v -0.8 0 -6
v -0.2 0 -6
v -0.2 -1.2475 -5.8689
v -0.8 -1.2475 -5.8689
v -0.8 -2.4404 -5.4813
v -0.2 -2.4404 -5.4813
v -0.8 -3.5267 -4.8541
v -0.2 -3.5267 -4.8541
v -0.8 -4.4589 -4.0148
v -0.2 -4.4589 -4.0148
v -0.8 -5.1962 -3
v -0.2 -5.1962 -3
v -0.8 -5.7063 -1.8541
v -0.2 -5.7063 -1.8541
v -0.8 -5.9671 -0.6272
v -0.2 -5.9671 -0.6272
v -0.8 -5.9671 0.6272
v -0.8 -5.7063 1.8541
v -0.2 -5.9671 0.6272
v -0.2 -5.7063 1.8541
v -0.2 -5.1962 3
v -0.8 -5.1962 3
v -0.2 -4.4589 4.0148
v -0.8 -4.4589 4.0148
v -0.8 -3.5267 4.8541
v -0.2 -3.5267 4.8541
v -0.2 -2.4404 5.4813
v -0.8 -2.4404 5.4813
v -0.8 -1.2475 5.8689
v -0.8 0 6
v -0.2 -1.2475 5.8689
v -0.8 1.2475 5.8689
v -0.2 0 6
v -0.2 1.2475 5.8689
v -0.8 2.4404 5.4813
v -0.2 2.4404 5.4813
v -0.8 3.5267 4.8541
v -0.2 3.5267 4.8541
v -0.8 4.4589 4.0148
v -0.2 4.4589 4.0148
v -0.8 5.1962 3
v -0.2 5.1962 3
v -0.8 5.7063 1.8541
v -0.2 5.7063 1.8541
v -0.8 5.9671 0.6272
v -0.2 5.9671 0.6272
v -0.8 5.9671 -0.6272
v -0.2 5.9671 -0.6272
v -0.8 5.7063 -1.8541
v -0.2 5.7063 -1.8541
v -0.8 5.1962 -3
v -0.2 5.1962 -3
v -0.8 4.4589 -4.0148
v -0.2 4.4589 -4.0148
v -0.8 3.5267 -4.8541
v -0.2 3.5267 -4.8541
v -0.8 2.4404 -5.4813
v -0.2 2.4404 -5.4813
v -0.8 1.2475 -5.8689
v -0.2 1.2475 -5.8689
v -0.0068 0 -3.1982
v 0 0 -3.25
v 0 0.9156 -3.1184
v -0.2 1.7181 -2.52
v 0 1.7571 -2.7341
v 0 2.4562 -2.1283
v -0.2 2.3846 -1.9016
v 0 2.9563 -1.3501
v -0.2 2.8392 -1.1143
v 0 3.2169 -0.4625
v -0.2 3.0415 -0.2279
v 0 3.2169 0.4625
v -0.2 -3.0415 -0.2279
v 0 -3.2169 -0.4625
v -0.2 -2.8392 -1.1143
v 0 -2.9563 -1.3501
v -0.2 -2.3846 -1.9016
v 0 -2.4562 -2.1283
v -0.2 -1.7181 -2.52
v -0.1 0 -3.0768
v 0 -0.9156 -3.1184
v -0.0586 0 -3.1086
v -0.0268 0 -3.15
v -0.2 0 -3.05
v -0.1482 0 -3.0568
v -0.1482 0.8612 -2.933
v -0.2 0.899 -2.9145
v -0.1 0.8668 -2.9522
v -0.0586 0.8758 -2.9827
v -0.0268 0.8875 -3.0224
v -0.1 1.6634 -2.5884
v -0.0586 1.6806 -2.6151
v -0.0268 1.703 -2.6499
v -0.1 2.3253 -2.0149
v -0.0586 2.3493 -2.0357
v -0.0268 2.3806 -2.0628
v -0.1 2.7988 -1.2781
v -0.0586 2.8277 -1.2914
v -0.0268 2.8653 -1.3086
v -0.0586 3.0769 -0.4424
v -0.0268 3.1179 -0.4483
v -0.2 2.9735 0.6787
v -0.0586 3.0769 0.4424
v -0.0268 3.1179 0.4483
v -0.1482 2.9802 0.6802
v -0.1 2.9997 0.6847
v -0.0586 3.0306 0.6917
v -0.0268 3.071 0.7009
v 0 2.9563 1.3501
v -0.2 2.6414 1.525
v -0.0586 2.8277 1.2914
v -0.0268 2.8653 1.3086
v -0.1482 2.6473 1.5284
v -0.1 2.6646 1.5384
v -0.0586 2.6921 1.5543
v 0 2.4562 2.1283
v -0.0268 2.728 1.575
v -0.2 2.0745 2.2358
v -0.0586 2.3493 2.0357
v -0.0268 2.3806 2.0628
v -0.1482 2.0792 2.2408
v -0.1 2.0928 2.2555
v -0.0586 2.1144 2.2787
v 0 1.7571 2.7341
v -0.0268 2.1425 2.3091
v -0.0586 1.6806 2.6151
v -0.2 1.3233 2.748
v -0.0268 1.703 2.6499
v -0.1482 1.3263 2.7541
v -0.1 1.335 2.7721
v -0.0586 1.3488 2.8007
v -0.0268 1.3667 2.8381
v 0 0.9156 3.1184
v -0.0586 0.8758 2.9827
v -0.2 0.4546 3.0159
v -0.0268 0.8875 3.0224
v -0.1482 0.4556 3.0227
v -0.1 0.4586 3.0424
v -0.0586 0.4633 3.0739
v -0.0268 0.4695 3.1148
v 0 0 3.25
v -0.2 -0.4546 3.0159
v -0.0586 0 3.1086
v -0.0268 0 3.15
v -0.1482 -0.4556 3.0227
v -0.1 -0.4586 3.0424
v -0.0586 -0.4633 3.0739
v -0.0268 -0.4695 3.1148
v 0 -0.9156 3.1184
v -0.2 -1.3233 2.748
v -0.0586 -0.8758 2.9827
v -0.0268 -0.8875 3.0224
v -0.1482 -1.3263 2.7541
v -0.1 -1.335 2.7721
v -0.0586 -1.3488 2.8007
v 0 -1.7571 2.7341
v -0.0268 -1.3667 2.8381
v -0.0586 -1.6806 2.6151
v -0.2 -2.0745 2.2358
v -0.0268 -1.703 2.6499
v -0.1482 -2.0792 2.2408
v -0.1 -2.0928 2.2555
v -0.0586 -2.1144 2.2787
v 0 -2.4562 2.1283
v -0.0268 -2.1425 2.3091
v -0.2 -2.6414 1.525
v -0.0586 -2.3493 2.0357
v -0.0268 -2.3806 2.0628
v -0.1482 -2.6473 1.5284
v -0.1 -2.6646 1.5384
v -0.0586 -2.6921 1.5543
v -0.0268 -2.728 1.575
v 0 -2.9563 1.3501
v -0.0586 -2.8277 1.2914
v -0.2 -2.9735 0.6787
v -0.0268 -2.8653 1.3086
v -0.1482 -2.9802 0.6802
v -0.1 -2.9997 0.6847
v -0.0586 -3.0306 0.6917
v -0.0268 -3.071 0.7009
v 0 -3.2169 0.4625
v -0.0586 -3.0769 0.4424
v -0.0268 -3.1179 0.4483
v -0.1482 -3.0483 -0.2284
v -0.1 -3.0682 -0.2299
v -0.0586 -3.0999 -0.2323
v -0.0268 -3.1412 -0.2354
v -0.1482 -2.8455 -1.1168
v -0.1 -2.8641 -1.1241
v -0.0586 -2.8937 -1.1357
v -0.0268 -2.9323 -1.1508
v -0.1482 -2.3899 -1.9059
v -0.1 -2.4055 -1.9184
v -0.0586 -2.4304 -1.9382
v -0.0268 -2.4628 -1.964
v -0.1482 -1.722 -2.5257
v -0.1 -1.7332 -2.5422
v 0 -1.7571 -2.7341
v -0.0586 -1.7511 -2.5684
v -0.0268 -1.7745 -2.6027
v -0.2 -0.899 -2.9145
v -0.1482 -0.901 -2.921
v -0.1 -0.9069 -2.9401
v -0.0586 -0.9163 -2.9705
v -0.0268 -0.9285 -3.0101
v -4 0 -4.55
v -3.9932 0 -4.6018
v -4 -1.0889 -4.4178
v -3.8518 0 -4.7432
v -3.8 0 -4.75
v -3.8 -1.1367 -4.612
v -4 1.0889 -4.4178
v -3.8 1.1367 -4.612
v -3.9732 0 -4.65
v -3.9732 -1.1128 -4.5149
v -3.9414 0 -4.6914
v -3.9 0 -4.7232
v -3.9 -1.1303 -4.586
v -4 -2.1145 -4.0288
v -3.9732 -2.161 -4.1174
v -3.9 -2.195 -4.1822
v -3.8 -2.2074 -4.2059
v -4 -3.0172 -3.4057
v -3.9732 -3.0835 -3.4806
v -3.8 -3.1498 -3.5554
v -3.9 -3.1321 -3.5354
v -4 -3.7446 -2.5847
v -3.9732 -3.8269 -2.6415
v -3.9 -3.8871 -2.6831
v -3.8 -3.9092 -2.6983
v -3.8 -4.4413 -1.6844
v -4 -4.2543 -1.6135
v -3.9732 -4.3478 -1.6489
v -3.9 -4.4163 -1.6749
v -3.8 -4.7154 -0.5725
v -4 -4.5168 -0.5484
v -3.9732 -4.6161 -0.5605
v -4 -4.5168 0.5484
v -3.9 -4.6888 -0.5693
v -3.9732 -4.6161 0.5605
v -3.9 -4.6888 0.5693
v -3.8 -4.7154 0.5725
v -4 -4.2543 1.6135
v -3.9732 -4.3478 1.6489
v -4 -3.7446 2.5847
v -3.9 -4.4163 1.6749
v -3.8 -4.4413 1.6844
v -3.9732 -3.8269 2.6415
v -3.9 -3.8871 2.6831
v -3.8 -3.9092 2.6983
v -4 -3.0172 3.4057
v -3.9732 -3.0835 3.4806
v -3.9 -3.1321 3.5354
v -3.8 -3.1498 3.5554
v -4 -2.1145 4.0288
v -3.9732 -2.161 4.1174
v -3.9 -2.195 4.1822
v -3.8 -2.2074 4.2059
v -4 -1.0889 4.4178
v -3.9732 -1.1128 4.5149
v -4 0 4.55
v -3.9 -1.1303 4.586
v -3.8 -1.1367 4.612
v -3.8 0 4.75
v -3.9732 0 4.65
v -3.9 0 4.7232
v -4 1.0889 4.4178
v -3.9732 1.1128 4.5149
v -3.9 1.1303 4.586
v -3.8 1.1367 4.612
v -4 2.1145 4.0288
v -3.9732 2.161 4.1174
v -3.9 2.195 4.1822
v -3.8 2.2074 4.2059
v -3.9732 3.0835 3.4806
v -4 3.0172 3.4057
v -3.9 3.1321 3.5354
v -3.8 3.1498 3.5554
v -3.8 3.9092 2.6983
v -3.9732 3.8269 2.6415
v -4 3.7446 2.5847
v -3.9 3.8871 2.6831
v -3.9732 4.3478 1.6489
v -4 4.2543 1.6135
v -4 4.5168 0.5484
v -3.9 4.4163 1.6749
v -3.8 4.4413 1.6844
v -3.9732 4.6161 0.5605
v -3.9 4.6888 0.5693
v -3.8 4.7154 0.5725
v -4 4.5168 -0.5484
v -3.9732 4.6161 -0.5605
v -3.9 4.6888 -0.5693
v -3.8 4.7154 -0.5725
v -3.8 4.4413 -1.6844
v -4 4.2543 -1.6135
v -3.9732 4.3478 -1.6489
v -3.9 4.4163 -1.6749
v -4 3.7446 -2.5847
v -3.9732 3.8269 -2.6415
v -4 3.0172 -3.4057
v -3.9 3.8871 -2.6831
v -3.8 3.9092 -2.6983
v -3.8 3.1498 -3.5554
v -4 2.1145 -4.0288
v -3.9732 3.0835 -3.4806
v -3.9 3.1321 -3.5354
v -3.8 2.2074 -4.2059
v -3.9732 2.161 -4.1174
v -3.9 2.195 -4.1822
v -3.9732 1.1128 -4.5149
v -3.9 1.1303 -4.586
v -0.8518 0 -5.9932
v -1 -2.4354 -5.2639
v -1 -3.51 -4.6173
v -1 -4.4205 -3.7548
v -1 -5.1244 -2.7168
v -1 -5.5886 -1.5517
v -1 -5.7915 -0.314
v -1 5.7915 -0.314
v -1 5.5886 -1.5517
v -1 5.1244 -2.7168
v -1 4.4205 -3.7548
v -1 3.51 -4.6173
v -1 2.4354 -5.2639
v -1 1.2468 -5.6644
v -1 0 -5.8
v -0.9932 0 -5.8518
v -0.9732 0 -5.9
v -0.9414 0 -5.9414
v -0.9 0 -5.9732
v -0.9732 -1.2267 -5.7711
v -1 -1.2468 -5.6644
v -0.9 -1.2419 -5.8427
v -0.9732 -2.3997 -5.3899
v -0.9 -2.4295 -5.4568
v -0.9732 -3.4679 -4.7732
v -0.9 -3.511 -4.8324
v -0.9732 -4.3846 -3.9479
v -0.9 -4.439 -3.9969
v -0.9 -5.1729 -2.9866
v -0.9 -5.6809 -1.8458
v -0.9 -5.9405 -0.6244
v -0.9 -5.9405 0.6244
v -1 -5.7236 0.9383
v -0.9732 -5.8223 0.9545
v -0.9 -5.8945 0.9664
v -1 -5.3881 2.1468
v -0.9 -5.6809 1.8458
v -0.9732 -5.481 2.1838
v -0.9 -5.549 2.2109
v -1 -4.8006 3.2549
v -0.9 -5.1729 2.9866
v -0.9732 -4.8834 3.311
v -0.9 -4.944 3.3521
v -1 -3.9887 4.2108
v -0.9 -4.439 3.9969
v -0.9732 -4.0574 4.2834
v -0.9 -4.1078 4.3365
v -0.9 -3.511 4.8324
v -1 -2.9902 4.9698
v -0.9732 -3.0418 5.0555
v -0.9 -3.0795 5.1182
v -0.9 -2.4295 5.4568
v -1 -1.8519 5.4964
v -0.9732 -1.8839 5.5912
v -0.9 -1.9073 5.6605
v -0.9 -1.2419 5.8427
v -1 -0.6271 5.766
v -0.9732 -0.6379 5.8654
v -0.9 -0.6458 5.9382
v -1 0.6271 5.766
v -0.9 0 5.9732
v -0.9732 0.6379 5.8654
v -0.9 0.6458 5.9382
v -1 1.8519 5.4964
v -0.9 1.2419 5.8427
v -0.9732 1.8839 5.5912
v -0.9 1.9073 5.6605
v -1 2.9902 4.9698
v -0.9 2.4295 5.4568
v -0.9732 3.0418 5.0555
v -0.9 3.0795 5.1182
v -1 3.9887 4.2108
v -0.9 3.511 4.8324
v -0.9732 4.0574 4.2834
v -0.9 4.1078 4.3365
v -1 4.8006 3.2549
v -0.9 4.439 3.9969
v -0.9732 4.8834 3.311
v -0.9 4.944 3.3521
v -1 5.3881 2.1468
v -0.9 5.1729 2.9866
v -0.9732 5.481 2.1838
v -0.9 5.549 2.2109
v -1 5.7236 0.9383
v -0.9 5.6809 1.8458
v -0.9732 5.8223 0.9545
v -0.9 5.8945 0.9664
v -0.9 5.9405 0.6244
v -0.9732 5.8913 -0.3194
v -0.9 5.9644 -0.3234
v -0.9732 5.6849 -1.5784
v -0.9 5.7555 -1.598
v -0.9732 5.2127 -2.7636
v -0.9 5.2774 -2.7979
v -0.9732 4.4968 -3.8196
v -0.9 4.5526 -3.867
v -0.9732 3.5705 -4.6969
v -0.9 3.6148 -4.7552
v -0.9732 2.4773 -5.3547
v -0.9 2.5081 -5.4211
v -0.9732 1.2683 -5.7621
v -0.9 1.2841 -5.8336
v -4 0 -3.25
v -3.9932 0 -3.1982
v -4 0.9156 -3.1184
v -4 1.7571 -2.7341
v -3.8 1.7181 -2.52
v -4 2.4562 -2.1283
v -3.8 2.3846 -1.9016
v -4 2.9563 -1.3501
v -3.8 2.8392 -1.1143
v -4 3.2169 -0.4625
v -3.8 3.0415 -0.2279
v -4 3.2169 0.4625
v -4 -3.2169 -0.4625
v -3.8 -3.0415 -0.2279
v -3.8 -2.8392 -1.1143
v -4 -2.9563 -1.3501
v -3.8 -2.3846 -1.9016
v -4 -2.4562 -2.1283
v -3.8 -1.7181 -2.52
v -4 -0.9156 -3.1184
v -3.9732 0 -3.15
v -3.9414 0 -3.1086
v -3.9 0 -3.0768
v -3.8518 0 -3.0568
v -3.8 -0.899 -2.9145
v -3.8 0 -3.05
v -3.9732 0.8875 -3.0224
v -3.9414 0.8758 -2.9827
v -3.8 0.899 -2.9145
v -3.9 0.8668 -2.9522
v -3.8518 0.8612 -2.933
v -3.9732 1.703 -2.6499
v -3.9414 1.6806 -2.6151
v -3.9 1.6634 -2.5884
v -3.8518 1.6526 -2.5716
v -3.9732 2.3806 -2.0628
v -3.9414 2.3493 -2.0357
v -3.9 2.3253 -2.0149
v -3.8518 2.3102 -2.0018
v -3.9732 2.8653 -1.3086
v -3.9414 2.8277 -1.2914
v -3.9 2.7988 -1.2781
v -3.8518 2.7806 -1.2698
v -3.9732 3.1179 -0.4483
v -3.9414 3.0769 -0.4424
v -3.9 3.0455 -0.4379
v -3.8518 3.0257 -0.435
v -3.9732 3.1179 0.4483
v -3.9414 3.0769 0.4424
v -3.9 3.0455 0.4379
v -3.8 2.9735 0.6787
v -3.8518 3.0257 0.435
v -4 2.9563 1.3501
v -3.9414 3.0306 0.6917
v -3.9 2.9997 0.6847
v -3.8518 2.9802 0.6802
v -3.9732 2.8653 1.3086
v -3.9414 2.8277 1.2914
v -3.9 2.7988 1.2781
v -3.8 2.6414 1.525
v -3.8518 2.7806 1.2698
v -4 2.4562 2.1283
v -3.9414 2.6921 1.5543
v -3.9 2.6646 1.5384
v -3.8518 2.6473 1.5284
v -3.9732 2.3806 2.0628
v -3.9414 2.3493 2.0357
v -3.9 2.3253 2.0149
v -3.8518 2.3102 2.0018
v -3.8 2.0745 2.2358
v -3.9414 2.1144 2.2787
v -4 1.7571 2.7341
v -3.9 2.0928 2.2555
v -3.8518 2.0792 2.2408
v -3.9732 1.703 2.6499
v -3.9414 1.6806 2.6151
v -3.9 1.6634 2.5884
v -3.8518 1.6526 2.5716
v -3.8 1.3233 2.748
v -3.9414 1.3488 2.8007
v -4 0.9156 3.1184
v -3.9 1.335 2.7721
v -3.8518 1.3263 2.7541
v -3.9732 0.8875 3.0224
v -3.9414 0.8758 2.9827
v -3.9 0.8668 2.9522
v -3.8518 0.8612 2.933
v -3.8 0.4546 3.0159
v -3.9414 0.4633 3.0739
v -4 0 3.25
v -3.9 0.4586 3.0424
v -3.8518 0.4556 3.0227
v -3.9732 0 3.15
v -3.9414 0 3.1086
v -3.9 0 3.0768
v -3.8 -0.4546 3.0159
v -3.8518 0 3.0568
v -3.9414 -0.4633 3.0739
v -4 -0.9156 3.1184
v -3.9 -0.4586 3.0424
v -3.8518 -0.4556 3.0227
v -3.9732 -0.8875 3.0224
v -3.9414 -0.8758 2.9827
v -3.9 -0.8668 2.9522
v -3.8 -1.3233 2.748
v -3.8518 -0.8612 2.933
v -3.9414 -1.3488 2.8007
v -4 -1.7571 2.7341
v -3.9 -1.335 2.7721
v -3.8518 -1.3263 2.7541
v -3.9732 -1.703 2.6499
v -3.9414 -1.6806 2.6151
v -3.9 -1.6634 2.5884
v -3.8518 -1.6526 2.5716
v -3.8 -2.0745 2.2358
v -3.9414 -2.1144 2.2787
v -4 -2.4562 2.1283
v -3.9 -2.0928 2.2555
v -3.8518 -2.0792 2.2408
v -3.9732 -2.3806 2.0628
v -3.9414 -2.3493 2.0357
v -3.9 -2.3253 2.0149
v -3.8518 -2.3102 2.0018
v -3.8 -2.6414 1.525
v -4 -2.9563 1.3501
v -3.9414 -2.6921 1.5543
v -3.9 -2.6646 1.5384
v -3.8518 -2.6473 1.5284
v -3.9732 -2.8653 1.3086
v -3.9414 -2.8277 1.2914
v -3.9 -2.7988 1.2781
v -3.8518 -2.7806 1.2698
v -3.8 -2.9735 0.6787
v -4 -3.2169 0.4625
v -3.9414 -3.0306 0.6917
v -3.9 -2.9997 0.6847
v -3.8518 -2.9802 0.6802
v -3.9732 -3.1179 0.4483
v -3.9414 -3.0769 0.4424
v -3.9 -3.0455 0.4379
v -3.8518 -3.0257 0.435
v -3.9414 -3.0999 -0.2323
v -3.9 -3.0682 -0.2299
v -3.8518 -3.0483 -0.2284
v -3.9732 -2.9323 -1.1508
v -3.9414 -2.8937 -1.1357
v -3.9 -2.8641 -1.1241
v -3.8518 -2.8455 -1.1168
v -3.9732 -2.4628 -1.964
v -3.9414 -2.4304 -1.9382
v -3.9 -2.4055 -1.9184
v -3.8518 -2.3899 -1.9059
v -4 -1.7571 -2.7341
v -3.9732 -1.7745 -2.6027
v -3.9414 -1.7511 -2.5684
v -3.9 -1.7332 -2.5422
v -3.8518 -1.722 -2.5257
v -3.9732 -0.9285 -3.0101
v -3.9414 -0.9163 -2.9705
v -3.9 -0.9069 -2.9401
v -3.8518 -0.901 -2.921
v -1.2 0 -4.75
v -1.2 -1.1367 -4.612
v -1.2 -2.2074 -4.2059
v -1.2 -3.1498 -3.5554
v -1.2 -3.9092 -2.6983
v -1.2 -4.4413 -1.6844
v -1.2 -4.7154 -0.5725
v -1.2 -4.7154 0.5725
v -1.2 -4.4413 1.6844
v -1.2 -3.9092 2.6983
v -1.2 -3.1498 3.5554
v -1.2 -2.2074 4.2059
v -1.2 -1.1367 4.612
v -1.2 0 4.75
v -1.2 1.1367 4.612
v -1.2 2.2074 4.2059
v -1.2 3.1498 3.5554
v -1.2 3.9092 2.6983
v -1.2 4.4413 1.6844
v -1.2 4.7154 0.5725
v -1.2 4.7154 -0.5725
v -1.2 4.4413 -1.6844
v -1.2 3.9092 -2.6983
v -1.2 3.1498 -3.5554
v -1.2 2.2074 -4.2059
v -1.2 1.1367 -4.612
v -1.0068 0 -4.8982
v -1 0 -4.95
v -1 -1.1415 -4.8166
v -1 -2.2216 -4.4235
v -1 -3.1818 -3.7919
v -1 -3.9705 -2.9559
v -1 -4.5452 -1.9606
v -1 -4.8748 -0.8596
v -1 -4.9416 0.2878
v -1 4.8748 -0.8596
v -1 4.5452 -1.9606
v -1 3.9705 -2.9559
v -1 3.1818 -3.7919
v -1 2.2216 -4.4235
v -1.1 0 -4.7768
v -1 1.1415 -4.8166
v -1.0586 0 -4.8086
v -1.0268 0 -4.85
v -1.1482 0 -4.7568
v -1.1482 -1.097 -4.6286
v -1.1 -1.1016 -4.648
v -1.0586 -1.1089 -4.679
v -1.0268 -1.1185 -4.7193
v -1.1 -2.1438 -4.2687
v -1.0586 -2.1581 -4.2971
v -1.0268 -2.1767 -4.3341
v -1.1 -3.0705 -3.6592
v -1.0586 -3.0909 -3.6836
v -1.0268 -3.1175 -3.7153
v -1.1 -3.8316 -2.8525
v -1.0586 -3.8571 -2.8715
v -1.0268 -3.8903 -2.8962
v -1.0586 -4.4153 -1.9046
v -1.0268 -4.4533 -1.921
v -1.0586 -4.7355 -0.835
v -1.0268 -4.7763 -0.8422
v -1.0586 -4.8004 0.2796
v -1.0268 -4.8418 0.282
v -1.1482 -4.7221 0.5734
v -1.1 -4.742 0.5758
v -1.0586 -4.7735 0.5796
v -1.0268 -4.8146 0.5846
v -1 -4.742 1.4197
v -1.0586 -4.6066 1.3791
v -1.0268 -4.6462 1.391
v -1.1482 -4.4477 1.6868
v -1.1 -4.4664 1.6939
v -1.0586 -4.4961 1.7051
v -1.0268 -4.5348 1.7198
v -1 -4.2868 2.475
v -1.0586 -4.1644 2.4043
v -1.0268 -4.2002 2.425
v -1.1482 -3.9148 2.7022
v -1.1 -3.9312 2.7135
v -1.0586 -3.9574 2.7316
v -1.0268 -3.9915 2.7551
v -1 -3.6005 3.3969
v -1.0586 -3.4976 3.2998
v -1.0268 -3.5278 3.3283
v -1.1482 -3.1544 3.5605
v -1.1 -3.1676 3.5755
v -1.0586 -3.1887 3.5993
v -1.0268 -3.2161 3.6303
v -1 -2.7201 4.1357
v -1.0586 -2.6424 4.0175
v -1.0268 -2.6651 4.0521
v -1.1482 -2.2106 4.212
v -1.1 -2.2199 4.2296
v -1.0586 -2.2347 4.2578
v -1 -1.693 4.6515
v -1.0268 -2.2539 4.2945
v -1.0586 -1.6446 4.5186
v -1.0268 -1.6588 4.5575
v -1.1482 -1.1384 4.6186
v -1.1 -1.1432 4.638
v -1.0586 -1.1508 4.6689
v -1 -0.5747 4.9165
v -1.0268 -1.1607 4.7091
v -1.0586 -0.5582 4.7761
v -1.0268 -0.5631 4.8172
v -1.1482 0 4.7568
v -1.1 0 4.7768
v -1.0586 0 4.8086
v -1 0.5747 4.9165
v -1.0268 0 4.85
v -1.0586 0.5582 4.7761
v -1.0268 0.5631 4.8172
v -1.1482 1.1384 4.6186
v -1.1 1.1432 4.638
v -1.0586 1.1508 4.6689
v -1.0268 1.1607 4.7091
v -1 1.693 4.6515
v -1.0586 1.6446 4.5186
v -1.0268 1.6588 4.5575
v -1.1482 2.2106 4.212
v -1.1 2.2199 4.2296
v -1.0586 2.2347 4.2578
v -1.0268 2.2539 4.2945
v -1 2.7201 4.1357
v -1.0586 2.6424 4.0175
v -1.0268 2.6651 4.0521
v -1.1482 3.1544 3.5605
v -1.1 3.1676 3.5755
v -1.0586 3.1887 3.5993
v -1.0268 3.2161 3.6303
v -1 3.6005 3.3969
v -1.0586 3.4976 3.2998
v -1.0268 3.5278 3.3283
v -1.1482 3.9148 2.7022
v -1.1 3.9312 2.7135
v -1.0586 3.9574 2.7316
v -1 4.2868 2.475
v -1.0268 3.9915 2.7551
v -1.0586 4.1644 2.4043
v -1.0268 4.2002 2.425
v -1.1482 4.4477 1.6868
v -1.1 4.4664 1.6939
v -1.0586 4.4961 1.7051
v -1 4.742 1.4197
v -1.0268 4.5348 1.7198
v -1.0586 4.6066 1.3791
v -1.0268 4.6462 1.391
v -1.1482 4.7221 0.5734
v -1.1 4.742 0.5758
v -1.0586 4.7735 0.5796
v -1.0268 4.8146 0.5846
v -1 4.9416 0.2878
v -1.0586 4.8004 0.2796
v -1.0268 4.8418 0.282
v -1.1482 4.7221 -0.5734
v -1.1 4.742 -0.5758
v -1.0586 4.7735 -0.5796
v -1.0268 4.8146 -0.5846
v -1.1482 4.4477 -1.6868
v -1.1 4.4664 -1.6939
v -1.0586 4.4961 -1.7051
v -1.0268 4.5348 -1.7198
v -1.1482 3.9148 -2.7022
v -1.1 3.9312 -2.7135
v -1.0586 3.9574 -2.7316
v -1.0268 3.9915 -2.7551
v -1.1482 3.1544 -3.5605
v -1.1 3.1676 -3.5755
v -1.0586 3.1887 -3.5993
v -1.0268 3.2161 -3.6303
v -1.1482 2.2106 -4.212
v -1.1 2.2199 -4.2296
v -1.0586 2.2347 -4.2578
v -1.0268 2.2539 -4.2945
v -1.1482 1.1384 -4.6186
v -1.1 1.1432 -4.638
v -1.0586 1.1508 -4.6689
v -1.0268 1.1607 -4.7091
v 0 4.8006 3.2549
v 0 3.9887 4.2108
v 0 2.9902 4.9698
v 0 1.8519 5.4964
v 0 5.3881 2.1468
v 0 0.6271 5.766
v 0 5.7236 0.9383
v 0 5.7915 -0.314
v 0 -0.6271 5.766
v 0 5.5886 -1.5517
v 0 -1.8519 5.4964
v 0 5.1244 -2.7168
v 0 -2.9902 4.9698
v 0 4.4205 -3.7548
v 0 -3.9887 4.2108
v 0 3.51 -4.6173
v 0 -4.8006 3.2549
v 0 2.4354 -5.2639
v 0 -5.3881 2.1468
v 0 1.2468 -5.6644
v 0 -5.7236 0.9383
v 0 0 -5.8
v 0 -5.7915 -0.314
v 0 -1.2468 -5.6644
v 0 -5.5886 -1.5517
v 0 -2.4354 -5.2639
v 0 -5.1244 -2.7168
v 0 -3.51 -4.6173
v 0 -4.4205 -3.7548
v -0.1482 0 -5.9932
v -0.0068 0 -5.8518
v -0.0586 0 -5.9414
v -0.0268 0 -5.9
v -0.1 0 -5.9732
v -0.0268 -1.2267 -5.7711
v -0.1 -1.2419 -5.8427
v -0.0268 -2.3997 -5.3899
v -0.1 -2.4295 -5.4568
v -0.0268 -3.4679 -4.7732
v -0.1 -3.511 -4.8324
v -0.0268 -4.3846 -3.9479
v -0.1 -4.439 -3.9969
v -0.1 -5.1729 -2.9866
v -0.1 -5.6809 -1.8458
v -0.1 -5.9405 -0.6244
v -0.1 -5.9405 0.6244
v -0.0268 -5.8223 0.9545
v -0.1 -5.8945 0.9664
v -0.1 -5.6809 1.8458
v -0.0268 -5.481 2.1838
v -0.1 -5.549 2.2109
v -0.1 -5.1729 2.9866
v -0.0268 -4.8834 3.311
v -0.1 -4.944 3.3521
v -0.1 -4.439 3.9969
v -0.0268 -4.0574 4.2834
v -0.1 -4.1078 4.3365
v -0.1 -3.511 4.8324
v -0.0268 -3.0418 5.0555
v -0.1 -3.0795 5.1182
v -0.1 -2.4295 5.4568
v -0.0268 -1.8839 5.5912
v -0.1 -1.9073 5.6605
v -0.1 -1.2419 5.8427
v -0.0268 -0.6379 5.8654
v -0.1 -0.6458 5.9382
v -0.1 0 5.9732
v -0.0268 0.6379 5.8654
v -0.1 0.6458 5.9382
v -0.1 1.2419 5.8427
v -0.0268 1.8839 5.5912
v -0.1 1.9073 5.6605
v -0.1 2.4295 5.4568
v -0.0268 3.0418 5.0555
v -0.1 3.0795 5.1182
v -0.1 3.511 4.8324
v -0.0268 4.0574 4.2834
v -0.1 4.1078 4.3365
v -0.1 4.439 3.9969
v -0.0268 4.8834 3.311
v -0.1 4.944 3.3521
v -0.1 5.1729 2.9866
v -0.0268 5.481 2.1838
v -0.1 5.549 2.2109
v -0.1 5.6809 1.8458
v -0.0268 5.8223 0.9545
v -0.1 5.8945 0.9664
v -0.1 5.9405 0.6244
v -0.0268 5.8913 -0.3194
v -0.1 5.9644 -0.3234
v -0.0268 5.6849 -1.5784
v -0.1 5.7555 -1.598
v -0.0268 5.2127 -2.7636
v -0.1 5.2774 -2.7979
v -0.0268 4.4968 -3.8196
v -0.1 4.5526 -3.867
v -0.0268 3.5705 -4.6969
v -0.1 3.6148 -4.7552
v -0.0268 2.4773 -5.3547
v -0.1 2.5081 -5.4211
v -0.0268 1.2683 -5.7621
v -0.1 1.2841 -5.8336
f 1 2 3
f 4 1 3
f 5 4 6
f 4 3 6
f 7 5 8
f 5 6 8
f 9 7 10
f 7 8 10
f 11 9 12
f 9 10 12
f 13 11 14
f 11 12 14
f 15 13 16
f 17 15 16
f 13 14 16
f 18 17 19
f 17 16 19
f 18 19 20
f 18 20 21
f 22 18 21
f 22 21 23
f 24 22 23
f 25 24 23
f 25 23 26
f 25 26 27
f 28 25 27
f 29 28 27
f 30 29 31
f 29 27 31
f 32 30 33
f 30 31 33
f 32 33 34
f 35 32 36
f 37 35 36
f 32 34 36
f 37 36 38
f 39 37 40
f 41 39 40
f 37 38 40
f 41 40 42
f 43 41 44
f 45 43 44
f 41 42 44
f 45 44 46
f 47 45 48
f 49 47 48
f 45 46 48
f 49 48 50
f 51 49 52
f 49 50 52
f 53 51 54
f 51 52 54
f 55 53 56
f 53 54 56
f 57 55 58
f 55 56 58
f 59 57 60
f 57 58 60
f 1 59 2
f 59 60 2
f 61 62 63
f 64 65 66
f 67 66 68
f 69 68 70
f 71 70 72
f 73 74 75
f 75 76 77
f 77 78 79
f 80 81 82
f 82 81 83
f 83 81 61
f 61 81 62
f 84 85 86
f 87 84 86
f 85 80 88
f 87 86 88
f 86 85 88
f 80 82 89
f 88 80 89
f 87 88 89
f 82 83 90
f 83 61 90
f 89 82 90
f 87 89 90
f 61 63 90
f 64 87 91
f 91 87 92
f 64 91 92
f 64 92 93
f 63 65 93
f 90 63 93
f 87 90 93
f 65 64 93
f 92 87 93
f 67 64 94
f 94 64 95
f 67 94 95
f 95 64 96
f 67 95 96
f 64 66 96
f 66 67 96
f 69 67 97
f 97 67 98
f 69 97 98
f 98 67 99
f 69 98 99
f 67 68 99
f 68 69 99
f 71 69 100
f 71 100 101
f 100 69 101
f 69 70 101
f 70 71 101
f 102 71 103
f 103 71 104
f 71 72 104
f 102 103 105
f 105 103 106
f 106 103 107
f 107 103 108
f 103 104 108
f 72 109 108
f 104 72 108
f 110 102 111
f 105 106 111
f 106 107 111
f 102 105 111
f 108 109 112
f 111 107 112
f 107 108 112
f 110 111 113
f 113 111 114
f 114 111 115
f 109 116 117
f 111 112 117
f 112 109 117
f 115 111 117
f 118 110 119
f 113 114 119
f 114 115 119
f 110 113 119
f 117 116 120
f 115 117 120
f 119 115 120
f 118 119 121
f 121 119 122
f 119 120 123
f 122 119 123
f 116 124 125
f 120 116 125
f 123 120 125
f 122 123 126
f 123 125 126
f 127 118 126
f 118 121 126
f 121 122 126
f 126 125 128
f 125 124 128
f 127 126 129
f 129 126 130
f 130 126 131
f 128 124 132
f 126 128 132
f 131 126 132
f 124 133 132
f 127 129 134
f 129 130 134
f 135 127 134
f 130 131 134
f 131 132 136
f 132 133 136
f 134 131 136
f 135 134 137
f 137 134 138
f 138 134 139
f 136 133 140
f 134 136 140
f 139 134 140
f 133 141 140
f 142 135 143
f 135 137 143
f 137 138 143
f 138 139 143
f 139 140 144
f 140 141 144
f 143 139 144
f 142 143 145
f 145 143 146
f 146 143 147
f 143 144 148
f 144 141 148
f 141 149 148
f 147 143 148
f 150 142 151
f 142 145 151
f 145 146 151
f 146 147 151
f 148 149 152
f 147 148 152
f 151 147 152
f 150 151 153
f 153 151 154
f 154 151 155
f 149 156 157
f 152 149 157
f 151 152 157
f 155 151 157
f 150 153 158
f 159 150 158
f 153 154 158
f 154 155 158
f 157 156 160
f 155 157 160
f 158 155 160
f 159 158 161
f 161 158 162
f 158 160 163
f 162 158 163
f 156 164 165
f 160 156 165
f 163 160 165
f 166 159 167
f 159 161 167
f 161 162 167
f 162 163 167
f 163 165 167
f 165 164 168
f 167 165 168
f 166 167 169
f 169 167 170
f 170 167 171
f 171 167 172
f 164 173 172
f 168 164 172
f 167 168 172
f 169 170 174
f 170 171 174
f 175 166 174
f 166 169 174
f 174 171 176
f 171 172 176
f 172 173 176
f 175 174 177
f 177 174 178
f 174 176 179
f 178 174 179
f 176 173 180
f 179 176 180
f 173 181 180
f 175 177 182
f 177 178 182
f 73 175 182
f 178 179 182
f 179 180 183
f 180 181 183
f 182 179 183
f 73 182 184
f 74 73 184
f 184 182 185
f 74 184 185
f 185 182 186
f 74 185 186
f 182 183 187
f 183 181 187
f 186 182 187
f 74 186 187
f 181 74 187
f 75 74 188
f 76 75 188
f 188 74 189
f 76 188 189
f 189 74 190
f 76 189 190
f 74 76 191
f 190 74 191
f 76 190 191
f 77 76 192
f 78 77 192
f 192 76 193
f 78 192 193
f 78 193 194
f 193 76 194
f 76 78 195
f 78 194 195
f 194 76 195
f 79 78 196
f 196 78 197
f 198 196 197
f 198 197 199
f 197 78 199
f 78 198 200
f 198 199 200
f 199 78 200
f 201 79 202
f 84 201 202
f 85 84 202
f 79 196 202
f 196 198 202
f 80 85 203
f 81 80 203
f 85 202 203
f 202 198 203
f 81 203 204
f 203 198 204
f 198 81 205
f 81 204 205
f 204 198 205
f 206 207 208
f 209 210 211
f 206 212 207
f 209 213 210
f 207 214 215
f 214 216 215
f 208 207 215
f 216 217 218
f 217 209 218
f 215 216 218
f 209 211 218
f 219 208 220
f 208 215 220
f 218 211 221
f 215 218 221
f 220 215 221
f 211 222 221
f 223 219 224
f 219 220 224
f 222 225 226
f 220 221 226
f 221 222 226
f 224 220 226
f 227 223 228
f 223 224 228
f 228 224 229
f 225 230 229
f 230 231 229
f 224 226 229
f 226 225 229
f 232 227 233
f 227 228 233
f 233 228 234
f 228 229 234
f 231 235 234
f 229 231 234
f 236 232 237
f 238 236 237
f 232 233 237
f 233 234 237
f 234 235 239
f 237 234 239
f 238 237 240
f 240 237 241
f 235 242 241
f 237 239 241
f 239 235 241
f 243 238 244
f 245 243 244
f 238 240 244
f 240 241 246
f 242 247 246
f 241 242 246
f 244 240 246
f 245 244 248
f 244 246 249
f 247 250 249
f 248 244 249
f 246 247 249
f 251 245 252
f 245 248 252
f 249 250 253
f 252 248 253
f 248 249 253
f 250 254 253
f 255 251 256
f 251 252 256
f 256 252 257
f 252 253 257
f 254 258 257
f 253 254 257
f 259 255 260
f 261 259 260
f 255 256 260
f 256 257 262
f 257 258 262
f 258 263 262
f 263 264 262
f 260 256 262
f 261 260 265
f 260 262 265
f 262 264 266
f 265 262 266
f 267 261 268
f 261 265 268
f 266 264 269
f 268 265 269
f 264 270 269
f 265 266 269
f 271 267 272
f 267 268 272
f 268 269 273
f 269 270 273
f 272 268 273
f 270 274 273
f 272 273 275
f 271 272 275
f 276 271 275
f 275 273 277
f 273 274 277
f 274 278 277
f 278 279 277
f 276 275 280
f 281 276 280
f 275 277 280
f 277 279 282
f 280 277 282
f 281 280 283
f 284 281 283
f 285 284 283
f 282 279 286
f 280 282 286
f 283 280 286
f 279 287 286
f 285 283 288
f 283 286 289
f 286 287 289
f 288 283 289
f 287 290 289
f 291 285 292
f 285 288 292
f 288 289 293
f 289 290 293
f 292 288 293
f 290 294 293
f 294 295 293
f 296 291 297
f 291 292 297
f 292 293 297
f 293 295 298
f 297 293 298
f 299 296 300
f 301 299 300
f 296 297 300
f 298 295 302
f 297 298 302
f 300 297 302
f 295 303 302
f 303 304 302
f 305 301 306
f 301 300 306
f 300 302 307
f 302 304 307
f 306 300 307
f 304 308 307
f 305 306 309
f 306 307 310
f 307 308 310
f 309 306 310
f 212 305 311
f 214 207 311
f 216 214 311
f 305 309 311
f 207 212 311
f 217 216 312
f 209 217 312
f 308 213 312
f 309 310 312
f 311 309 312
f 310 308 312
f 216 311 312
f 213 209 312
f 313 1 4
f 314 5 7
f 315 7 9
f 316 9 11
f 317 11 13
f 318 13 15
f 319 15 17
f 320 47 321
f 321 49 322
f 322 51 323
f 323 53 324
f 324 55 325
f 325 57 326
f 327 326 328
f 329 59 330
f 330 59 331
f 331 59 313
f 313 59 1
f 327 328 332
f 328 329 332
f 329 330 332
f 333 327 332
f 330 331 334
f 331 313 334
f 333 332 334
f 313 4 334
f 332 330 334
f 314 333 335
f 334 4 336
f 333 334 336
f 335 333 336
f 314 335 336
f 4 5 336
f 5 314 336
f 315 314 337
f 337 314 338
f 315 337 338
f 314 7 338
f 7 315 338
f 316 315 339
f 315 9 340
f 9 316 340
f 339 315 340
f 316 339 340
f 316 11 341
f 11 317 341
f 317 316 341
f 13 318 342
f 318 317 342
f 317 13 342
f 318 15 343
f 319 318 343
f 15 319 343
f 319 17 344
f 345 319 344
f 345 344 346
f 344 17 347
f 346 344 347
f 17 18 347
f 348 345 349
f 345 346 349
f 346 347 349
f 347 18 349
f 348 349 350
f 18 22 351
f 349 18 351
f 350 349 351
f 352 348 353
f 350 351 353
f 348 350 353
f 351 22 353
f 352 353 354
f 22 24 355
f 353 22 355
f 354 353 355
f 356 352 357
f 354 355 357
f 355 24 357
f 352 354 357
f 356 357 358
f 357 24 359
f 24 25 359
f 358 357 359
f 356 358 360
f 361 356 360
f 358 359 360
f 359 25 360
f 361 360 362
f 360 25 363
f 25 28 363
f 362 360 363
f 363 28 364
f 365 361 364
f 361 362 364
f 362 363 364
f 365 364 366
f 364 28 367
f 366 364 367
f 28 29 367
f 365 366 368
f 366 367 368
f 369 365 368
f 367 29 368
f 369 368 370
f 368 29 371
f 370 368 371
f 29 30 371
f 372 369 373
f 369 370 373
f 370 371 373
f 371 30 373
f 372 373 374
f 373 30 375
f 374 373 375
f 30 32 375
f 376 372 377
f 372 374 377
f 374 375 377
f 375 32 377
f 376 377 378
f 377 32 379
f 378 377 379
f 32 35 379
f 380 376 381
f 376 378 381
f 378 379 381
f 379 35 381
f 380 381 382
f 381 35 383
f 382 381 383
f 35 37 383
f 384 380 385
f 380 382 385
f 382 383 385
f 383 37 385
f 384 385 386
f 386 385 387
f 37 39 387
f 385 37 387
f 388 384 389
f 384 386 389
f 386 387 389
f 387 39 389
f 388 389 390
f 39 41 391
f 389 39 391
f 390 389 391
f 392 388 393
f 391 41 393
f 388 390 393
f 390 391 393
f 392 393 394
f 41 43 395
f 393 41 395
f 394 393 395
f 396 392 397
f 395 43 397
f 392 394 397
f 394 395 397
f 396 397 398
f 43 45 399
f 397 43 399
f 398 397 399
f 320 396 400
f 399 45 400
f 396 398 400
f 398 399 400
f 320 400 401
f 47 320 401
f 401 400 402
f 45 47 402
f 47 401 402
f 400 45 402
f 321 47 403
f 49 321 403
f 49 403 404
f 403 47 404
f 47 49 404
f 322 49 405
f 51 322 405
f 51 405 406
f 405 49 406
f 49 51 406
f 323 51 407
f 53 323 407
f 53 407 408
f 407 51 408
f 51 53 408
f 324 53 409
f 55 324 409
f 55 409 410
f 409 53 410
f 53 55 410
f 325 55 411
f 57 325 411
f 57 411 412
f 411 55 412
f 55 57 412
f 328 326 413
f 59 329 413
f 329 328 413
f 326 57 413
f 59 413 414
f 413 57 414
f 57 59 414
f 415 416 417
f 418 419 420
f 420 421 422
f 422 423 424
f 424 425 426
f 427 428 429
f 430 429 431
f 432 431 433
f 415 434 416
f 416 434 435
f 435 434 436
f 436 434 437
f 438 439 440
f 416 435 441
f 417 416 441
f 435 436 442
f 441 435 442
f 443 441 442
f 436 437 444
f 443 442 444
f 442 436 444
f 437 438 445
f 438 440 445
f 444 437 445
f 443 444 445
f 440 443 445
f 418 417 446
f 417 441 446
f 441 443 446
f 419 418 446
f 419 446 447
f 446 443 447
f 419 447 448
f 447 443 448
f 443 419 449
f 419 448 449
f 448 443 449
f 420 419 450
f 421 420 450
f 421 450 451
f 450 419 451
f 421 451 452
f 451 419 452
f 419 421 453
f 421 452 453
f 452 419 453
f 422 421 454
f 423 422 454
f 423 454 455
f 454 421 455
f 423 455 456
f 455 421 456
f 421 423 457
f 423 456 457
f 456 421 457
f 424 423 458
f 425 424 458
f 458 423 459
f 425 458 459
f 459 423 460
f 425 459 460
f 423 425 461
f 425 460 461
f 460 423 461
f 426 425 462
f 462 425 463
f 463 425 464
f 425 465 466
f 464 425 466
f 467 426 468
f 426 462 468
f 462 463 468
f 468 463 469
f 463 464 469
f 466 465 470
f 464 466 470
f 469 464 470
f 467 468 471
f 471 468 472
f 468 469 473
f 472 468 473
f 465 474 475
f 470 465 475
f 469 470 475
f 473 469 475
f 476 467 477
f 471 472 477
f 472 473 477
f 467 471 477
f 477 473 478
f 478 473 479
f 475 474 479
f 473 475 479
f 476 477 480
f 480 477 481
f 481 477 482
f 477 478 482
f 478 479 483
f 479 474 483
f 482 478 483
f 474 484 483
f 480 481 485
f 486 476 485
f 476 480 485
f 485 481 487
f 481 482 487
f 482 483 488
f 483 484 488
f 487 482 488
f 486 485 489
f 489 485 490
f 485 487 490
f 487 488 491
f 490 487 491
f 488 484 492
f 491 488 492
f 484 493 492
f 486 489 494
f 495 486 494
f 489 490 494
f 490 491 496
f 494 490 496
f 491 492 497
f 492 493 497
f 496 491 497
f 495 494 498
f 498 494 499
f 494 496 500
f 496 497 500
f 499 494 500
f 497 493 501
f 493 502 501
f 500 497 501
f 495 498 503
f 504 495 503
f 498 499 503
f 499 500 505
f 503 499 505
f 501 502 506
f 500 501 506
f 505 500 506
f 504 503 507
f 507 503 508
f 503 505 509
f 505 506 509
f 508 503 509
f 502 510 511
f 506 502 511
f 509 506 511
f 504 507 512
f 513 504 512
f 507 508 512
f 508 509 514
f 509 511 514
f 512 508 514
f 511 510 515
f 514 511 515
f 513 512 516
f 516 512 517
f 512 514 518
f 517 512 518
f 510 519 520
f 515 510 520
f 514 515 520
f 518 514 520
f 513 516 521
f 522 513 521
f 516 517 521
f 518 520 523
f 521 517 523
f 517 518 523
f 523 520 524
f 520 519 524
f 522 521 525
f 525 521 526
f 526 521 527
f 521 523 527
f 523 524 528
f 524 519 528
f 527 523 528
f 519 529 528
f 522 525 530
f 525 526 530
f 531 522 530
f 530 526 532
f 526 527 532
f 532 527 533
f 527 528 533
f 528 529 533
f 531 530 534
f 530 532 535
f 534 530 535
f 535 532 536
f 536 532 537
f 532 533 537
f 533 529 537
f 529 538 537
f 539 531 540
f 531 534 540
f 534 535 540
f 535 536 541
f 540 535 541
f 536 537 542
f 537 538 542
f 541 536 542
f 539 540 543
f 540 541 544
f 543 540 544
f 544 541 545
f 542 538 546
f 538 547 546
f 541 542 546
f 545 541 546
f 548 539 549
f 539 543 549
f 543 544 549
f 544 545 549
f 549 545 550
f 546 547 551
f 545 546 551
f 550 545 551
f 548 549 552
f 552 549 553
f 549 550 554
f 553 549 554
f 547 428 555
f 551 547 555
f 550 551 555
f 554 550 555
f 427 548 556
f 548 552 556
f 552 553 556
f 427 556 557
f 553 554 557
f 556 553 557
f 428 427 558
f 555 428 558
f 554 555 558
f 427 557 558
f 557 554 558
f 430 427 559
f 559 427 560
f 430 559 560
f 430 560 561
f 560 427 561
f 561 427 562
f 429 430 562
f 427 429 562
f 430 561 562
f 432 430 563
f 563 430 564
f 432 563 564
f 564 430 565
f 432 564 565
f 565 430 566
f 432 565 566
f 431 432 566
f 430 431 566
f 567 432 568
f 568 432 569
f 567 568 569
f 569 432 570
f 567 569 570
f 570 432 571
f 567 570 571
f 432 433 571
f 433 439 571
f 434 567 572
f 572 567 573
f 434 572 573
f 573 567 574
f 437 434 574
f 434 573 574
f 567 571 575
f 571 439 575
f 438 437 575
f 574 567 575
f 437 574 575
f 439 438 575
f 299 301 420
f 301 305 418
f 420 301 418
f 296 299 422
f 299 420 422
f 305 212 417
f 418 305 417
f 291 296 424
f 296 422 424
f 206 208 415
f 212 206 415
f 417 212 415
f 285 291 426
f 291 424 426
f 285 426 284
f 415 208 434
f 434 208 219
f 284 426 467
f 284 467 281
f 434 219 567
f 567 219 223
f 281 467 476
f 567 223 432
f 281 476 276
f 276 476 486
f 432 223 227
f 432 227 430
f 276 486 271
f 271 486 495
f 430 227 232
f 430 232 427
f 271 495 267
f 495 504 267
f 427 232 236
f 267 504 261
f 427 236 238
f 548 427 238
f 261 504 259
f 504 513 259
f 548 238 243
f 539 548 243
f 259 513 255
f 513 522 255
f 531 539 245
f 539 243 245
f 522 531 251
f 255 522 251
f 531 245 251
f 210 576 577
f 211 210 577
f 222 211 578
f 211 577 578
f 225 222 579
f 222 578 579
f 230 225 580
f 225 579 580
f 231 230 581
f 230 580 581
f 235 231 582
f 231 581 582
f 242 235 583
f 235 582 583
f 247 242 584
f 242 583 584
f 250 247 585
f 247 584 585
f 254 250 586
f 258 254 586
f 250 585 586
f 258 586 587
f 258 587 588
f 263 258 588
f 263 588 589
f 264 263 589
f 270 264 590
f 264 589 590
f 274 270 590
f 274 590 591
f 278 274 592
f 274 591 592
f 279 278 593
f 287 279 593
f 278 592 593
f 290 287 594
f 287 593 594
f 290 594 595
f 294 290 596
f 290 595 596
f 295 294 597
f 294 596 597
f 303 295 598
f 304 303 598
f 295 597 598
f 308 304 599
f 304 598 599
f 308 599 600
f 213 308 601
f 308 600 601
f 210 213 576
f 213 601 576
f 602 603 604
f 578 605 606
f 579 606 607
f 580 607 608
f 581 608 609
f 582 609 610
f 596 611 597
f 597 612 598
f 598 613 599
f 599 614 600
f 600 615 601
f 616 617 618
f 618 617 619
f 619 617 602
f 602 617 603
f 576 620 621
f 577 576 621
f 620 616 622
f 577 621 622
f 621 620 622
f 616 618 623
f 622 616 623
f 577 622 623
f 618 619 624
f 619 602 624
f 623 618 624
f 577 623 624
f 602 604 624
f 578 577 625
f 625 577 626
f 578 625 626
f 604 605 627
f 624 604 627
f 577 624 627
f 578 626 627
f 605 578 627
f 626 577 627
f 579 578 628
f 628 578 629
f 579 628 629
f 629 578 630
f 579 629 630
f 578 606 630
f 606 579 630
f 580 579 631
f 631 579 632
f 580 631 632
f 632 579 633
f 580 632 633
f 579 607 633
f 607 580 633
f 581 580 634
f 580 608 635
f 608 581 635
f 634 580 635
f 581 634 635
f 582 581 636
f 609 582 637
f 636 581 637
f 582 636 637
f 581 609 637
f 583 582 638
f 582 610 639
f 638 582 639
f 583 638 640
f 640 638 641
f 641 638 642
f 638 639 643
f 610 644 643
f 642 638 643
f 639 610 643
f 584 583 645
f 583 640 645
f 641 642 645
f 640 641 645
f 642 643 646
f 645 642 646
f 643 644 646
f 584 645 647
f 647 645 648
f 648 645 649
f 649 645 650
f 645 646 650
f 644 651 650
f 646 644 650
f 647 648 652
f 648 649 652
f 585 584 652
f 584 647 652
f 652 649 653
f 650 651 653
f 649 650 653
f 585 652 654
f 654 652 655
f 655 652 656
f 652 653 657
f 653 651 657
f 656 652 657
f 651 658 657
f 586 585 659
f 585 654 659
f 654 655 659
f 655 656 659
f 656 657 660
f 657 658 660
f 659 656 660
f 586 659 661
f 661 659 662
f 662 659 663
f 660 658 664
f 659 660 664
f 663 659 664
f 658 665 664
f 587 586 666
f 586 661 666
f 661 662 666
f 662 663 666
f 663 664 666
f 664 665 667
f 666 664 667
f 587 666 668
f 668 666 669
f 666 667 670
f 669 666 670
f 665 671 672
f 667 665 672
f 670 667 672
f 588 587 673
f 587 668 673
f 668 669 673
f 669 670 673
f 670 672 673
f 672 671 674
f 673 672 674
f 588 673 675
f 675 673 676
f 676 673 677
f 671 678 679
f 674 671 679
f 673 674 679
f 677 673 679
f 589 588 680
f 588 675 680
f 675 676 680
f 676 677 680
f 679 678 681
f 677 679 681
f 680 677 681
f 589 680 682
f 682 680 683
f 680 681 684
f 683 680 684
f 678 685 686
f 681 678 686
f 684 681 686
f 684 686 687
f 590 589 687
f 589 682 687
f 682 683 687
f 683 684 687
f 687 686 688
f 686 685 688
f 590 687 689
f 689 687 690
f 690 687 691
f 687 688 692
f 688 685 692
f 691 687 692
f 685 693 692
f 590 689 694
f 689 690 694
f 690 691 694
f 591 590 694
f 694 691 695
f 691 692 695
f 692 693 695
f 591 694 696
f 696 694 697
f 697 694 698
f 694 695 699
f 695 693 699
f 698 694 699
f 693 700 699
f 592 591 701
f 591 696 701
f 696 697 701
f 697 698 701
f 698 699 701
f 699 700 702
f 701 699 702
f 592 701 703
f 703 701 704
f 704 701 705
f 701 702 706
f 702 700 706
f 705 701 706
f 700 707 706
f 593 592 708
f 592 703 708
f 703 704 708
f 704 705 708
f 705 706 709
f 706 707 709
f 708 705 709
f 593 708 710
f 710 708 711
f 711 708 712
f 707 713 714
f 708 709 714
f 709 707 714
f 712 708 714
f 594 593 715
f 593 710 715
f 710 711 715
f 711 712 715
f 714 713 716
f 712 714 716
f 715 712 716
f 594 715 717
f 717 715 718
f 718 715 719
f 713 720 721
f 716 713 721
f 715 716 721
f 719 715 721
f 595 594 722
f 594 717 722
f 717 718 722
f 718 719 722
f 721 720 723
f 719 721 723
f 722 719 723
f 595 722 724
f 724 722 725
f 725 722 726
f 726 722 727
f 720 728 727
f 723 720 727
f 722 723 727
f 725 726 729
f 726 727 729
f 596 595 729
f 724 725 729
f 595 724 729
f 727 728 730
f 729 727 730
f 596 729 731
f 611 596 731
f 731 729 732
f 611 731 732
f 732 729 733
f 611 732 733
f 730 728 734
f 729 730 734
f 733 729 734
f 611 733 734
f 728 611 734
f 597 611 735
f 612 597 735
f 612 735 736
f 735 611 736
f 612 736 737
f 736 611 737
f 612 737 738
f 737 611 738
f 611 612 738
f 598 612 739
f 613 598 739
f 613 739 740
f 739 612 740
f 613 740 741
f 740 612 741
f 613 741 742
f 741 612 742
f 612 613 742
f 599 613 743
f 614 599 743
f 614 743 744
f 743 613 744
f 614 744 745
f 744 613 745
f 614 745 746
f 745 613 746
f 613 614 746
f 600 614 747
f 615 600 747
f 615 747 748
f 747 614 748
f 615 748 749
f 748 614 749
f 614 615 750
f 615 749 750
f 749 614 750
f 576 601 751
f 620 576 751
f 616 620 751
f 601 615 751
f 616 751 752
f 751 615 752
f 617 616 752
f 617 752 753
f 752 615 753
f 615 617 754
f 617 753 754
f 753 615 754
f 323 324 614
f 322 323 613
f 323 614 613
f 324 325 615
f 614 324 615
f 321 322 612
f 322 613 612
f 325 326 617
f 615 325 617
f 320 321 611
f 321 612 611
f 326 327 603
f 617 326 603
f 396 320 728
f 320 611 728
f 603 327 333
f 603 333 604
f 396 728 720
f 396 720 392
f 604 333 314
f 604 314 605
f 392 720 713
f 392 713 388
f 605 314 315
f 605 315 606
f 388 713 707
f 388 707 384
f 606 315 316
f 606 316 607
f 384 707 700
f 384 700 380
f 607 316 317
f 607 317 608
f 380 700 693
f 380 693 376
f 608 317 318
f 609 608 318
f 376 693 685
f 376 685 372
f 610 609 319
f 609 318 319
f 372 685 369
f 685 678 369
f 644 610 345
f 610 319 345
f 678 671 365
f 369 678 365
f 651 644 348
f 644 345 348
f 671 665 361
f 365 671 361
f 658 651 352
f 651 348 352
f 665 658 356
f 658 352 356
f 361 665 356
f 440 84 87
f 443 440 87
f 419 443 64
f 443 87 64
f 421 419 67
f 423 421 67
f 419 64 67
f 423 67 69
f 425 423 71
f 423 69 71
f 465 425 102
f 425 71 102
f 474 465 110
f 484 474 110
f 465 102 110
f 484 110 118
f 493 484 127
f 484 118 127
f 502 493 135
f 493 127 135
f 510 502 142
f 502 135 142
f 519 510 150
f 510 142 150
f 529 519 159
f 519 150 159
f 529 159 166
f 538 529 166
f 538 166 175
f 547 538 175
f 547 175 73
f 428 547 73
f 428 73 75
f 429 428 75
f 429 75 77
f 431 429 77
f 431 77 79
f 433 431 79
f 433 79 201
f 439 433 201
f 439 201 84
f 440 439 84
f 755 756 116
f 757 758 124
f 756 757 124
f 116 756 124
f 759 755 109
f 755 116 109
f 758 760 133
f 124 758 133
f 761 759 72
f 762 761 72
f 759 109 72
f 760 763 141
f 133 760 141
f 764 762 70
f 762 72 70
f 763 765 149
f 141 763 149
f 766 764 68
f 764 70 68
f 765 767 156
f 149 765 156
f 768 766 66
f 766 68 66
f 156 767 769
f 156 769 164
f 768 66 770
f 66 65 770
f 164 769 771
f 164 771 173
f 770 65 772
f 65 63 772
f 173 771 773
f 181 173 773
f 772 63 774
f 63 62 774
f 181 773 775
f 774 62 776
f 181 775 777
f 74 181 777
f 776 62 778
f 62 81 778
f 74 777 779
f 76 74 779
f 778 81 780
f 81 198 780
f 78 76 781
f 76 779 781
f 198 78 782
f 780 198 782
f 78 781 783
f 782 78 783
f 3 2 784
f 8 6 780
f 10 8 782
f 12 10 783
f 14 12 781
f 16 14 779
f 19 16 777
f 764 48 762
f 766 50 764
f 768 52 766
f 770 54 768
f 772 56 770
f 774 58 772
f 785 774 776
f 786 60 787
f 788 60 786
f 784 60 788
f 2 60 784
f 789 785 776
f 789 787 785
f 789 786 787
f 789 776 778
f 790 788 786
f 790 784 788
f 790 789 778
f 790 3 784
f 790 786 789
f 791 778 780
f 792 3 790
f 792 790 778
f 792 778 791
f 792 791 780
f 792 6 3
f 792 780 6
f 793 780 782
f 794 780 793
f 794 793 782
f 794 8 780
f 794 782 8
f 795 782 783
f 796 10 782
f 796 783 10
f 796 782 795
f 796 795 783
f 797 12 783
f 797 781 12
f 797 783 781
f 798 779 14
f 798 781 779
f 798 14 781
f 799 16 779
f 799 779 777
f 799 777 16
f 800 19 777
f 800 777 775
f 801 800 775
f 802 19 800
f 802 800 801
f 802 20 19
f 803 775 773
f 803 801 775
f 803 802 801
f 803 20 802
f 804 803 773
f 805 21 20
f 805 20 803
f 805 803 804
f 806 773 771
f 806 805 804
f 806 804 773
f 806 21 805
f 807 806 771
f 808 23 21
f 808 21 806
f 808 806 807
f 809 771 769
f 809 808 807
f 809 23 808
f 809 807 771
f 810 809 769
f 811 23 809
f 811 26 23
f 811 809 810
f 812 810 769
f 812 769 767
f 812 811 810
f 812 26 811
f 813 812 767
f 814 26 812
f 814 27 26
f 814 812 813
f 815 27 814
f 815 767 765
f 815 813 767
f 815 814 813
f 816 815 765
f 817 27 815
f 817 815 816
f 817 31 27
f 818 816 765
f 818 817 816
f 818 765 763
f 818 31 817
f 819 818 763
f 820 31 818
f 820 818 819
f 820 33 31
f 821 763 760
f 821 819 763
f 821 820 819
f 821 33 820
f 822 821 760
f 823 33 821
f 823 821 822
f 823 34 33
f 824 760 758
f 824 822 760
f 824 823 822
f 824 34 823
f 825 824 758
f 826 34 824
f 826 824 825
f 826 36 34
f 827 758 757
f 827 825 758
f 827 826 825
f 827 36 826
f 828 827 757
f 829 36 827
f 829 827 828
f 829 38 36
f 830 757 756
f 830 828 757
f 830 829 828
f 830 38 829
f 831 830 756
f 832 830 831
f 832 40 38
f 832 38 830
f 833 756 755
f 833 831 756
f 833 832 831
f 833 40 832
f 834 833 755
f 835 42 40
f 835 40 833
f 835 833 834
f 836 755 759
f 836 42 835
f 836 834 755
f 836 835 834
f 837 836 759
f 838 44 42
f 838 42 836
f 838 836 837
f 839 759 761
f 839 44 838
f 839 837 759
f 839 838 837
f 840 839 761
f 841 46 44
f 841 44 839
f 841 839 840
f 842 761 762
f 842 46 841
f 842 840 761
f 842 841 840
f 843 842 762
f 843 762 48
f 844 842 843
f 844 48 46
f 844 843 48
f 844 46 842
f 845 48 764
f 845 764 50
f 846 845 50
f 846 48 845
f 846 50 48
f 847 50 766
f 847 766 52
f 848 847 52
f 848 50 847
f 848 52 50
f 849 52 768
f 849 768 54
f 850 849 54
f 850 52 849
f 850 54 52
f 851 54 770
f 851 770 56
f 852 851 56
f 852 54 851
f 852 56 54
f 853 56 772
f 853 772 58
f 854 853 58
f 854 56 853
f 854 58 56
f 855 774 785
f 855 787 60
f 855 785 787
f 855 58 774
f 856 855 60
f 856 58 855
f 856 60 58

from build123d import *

# Parameters (mm, degrees)
CUT_EXTRUDE1_REACH = 11.381
SKETCH2_R          = 3.05
FILLET1_R          = 0.2


with BuildPart() as part:
    # Sketch1 → Revolve1 (revolve)
    with BuildSketch(Plane.XY, mode=Mode.PRIVATE) as revolve1_sk:
        Polygon((-4, 0), (-4, 4.75), (-1, 4.75), (-1, 6), (0, 6), (0, 0), align=None)
    revolve(revolve1_sk.sketch.rotate(Axis((0, 0, 0), (-1, 0, 0)), 90), axis=Axis((0, 0, 0), (-1, 0, 0)))

    # Sketch2 → Cut-Extrude1 (cut, up to next)
    with BuildSketch(Plane(origin=(0, 0, 0), x_dir=(0, 0, -1), z_dir=(1, 0, 0)), mode=Mode.PRIVATE) as cut_extrude1_sk1:
        Circle(SKETCH2_R)
    cut_extrude1_tool1 = extrude(cut_extrude1_sk1.sketch, amount=-CUT_EXTRUDE1_REACH, mode=Mode.PRIVATE) & part.part
    add(cut_extrude1_tool1.solids().sort_by_distance((0, 0, 0))[0], mode=Mode.SUBTRACT)

    # Fillet1
    fillet1_edges = [part.edges().sort_by_distance(p)[0] for p in [
        (-4, 0, 3.05),
        (0, 0, 3.05),
        (0, 0, 6),
        (-1, 0, 6),
        (-1, 0, 4.75),
        (-4, 0, 4.75),
    ]]
    fillet(fillet1_edges, radius=FILLET1_R)


solid = part.part
